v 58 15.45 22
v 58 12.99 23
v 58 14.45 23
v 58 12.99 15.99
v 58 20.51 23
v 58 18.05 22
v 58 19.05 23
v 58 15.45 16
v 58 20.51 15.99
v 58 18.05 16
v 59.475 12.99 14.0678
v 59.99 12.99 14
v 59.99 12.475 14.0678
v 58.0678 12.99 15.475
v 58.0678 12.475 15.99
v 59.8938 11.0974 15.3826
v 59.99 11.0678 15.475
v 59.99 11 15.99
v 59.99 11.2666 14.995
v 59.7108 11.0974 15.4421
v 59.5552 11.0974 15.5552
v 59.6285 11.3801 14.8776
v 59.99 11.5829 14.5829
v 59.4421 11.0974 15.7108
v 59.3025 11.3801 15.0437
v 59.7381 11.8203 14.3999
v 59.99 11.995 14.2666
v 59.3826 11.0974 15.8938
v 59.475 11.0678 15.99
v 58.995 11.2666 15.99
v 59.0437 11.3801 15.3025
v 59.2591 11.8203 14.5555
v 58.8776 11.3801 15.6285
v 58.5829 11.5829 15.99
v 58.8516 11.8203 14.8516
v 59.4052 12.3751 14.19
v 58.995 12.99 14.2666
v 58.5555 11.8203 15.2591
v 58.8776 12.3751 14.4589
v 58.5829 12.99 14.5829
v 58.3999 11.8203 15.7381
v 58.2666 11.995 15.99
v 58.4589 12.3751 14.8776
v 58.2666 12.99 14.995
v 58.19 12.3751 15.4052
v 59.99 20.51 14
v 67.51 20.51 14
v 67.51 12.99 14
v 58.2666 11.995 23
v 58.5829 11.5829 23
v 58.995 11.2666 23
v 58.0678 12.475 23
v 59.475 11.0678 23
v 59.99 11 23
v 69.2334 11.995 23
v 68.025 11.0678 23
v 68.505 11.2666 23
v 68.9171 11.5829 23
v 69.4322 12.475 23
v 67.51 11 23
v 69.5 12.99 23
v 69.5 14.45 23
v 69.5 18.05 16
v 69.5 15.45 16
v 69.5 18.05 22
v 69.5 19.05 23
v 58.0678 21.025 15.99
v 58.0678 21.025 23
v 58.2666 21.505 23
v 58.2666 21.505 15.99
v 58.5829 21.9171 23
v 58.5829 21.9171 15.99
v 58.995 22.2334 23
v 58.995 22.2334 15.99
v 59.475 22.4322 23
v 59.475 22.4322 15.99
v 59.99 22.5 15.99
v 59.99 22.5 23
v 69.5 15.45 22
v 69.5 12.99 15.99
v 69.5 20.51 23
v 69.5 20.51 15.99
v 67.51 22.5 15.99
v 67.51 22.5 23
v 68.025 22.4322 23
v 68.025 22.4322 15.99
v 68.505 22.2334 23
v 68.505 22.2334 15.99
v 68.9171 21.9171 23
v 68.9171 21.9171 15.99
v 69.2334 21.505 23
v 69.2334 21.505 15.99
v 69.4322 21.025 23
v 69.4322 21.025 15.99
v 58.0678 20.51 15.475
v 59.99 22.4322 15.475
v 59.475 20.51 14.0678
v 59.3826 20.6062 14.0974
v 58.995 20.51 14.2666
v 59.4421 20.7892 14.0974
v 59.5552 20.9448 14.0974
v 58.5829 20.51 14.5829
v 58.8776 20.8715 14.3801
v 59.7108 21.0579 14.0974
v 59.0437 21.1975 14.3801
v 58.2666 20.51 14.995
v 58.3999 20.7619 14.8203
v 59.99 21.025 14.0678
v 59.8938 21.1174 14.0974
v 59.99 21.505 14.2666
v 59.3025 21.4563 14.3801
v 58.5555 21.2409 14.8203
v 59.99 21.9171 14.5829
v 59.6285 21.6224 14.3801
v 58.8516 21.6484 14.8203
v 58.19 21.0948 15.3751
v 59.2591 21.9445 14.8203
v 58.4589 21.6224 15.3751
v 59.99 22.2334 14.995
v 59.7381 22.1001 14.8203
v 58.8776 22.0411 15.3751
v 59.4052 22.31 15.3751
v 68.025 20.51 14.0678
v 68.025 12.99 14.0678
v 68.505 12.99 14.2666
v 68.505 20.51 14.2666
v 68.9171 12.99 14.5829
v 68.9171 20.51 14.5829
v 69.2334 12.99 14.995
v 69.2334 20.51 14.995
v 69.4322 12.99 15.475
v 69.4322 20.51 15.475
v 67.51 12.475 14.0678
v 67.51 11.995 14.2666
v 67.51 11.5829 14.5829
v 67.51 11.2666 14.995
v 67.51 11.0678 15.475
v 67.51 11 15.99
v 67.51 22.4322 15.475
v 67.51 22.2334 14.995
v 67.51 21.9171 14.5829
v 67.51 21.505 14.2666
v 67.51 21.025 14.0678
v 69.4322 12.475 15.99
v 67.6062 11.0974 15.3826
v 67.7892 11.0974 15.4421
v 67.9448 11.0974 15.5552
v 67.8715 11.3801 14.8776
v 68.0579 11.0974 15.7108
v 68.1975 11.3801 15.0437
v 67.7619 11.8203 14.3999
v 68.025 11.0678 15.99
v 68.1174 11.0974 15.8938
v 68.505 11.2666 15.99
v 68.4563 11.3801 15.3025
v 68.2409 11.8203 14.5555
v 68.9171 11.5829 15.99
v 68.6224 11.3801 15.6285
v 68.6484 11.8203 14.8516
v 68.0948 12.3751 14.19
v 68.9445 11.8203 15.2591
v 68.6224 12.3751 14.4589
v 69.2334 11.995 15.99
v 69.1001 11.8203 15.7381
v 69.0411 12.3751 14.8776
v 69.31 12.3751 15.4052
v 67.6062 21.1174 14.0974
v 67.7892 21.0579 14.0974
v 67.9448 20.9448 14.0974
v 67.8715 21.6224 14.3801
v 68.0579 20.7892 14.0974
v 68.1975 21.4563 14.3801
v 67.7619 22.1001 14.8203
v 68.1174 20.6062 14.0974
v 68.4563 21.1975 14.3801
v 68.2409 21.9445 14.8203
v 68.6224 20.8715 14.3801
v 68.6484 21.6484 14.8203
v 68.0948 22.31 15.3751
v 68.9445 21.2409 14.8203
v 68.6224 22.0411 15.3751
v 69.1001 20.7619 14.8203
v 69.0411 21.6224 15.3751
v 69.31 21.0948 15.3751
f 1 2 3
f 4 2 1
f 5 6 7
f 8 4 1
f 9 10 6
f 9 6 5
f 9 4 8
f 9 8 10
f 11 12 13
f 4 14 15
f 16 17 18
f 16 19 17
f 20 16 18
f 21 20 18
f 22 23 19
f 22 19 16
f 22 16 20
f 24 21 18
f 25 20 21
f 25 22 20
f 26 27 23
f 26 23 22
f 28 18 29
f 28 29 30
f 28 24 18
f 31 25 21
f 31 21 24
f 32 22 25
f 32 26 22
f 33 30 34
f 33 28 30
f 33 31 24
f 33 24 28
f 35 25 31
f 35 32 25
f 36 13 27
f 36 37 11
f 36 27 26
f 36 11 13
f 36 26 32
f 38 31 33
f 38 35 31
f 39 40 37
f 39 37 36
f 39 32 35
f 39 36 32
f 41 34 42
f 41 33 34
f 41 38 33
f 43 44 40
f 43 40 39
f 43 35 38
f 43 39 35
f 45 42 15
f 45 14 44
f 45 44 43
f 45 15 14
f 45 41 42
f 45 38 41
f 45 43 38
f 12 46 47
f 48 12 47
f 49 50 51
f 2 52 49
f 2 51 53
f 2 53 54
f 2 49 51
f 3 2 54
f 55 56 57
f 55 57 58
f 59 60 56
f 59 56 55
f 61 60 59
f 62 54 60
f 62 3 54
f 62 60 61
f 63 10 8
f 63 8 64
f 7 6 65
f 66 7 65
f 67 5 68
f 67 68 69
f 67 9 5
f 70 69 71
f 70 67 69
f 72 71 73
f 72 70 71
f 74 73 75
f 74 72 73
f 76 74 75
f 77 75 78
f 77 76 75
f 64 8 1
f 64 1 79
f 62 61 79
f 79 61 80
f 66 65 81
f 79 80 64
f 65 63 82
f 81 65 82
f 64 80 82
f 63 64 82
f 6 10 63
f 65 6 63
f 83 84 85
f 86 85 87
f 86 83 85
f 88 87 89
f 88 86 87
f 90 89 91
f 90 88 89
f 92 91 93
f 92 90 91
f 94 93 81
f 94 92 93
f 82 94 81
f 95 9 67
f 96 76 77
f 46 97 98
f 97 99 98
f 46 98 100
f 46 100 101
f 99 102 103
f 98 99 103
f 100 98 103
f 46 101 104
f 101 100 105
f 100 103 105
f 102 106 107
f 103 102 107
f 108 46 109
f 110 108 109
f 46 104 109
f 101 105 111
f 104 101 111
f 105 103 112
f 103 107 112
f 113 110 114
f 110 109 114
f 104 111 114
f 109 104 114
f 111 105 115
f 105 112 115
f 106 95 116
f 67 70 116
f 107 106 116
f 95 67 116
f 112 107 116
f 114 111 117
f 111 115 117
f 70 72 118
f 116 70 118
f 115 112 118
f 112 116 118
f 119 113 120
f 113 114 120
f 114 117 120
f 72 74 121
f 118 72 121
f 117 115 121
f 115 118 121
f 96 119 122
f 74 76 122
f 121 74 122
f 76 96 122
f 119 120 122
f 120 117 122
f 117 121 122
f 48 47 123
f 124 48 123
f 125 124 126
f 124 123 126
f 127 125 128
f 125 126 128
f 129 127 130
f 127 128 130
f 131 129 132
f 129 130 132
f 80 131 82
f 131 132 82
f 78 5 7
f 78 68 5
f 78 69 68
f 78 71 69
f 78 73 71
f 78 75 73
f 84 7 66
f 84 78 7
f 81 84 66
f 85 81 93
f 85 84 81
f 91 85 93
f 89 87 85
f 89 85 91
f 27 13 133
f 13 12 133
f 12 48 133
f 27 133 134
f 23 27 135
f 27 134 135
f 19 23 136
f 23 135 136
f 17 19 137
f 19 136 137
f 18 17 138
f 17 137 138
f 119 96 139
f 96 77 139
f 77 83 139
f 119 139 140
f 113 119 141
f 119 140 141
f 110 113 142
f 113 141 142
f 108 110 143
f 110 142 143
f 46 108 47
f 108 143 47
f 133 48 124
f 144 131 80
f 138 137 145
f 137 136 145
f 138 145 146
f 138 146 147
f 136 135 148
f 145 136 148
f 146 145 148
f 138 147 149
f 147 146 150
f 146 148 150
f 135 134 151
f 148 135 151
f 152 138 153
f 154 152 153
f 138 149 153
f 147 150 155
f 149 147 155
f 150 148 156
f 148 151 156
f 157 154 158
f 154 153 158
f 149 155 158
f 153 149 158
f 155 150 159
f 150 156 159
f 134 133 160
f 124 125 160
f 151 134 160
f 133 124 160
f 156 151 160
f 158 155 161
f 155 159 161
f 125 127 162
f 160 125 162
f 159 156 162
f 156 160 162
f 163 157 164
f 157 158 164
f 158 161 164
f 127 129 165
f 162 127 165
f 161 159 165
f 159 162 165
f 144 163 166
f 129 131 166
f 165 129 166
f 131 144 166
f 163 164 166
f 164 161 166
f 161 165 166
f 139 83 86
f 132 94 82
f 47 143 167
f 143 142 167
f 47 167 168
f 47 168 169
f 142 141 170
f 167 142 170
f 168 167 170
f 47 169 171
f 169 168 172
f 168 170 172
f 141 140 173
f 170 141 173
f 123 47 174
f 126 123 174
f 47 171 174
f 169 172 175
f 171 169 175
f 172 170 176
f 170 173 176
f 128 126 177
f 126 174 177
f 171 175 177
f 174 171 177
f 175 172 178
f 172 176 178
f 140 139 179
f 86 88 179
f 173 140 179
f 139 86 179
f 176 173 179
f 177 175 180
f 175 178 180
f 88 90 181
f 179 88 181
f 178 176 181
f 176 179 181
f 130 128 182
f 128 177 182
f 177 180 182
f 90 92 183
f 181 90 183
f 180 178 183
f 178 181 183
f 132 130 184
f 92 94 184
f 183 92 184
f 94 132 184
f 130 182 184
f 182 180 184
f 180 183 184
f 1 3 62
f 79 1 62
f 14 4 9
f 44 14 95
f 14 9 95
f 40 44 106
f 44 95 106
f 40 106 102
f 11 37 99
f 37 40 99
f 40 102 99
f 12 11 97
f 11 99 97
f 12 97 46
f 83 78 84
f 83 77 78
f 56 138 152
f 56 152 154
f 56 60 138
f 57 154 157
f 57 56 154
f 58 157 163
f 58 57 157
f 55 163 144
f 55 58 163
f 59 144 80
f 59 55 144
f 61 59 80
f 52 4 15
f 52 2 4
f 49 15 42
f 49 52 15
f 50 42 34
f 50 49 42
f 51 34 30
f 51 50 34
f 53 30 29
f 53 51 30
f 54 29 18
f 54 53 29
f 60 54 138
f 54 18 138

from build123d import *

# Parameters (mm, degrees)
BOX025_W        = 11.5
BOX025_H        = 11.5
BOX025_DEPTH    = 2
BOX023_W        = 11.5
BOX023_H        = 4.45
BOX023_DEPTH    = 7
BOX022_W        = 11.5
BOX022_H        = 4.45
BOX022_DEPTH    = 7
CHAMFER003_SIZE = 1
FILLET008_R     = 1.99


with BuildPart() as beltclipbase:
    # Box025 → Box025 (new body)
    with BuildSketch(Plane(origin=(40, 9, 14), x_dir=(1, 0, 0), z_dir=(0, 0, 1))):
        with Locations((5.75, 5.75)):
            Rectangle(BOX025_W, BOX025_H)
    extrude(amount=BOX025_DEPTH)


with BuildPart() as beltclipright:
    # Box023 → Box023 (new body)
    with BuildSketch(Plane(origin=(40, 16.05, 16), x_dir=(1, 0, 0), z_dir=(0, 0, 1))):
        with Locations((5.75, 2.225)):
            Rectangle(BOX023_W, BOX023_H)
    extrude(amount=BOX023_DEPTH)


with BuildPart() as belt_clip:
    # Box022 → Box022 (new body)
    with BuildSketch(Plane(origin=(40, 9, 16), x_dir=(1, 0, 0), z_dir=(0, 0, 1))):
        with Locations((5.75, 2.225)):
            Rectangle(BOX022_W, BOX022_H)
    extrude(amount=BOX022_DEPTH)

    # Fusion030: union BeltClipBase, BeltClipRight
    add(beltclipbase.part)
    add(beltclipright.part)

    # Chamfer003
    chamfer003_edges = [belt_clip.edges().sort_by_distance(p)[0] for p in [
        (45.75, 16.05, 23),
        (45.75, 13.45, 23),
    ]]
    chamfer(chamfer003_edges, length=CHAMFER003_SIZE)

    # Fillet008
    fillet008_edges = [belt_clip.edges().sort_by_distance(p)[0] for p in [
        (40, 20.5, 19.5),
        (51.5, 20.5, 19.5),
        (40, 14.75, 14),
        (45.75, 20.5, 14),
        (51.5, 14.75, 14),
        (45.75, 9, 14),
        (40, 9, 19.5),
        (51.5, 9, 19.5),
    ]]
    fillet(fillet008_edges, radius=FILLET008_R)


with BuildPart() as belt_clip_1:
    # Fillet008 placement: moved
    add(belt_clip.part.moved(Location((18, 2, 0))))


solid = belt_clip_1.part
